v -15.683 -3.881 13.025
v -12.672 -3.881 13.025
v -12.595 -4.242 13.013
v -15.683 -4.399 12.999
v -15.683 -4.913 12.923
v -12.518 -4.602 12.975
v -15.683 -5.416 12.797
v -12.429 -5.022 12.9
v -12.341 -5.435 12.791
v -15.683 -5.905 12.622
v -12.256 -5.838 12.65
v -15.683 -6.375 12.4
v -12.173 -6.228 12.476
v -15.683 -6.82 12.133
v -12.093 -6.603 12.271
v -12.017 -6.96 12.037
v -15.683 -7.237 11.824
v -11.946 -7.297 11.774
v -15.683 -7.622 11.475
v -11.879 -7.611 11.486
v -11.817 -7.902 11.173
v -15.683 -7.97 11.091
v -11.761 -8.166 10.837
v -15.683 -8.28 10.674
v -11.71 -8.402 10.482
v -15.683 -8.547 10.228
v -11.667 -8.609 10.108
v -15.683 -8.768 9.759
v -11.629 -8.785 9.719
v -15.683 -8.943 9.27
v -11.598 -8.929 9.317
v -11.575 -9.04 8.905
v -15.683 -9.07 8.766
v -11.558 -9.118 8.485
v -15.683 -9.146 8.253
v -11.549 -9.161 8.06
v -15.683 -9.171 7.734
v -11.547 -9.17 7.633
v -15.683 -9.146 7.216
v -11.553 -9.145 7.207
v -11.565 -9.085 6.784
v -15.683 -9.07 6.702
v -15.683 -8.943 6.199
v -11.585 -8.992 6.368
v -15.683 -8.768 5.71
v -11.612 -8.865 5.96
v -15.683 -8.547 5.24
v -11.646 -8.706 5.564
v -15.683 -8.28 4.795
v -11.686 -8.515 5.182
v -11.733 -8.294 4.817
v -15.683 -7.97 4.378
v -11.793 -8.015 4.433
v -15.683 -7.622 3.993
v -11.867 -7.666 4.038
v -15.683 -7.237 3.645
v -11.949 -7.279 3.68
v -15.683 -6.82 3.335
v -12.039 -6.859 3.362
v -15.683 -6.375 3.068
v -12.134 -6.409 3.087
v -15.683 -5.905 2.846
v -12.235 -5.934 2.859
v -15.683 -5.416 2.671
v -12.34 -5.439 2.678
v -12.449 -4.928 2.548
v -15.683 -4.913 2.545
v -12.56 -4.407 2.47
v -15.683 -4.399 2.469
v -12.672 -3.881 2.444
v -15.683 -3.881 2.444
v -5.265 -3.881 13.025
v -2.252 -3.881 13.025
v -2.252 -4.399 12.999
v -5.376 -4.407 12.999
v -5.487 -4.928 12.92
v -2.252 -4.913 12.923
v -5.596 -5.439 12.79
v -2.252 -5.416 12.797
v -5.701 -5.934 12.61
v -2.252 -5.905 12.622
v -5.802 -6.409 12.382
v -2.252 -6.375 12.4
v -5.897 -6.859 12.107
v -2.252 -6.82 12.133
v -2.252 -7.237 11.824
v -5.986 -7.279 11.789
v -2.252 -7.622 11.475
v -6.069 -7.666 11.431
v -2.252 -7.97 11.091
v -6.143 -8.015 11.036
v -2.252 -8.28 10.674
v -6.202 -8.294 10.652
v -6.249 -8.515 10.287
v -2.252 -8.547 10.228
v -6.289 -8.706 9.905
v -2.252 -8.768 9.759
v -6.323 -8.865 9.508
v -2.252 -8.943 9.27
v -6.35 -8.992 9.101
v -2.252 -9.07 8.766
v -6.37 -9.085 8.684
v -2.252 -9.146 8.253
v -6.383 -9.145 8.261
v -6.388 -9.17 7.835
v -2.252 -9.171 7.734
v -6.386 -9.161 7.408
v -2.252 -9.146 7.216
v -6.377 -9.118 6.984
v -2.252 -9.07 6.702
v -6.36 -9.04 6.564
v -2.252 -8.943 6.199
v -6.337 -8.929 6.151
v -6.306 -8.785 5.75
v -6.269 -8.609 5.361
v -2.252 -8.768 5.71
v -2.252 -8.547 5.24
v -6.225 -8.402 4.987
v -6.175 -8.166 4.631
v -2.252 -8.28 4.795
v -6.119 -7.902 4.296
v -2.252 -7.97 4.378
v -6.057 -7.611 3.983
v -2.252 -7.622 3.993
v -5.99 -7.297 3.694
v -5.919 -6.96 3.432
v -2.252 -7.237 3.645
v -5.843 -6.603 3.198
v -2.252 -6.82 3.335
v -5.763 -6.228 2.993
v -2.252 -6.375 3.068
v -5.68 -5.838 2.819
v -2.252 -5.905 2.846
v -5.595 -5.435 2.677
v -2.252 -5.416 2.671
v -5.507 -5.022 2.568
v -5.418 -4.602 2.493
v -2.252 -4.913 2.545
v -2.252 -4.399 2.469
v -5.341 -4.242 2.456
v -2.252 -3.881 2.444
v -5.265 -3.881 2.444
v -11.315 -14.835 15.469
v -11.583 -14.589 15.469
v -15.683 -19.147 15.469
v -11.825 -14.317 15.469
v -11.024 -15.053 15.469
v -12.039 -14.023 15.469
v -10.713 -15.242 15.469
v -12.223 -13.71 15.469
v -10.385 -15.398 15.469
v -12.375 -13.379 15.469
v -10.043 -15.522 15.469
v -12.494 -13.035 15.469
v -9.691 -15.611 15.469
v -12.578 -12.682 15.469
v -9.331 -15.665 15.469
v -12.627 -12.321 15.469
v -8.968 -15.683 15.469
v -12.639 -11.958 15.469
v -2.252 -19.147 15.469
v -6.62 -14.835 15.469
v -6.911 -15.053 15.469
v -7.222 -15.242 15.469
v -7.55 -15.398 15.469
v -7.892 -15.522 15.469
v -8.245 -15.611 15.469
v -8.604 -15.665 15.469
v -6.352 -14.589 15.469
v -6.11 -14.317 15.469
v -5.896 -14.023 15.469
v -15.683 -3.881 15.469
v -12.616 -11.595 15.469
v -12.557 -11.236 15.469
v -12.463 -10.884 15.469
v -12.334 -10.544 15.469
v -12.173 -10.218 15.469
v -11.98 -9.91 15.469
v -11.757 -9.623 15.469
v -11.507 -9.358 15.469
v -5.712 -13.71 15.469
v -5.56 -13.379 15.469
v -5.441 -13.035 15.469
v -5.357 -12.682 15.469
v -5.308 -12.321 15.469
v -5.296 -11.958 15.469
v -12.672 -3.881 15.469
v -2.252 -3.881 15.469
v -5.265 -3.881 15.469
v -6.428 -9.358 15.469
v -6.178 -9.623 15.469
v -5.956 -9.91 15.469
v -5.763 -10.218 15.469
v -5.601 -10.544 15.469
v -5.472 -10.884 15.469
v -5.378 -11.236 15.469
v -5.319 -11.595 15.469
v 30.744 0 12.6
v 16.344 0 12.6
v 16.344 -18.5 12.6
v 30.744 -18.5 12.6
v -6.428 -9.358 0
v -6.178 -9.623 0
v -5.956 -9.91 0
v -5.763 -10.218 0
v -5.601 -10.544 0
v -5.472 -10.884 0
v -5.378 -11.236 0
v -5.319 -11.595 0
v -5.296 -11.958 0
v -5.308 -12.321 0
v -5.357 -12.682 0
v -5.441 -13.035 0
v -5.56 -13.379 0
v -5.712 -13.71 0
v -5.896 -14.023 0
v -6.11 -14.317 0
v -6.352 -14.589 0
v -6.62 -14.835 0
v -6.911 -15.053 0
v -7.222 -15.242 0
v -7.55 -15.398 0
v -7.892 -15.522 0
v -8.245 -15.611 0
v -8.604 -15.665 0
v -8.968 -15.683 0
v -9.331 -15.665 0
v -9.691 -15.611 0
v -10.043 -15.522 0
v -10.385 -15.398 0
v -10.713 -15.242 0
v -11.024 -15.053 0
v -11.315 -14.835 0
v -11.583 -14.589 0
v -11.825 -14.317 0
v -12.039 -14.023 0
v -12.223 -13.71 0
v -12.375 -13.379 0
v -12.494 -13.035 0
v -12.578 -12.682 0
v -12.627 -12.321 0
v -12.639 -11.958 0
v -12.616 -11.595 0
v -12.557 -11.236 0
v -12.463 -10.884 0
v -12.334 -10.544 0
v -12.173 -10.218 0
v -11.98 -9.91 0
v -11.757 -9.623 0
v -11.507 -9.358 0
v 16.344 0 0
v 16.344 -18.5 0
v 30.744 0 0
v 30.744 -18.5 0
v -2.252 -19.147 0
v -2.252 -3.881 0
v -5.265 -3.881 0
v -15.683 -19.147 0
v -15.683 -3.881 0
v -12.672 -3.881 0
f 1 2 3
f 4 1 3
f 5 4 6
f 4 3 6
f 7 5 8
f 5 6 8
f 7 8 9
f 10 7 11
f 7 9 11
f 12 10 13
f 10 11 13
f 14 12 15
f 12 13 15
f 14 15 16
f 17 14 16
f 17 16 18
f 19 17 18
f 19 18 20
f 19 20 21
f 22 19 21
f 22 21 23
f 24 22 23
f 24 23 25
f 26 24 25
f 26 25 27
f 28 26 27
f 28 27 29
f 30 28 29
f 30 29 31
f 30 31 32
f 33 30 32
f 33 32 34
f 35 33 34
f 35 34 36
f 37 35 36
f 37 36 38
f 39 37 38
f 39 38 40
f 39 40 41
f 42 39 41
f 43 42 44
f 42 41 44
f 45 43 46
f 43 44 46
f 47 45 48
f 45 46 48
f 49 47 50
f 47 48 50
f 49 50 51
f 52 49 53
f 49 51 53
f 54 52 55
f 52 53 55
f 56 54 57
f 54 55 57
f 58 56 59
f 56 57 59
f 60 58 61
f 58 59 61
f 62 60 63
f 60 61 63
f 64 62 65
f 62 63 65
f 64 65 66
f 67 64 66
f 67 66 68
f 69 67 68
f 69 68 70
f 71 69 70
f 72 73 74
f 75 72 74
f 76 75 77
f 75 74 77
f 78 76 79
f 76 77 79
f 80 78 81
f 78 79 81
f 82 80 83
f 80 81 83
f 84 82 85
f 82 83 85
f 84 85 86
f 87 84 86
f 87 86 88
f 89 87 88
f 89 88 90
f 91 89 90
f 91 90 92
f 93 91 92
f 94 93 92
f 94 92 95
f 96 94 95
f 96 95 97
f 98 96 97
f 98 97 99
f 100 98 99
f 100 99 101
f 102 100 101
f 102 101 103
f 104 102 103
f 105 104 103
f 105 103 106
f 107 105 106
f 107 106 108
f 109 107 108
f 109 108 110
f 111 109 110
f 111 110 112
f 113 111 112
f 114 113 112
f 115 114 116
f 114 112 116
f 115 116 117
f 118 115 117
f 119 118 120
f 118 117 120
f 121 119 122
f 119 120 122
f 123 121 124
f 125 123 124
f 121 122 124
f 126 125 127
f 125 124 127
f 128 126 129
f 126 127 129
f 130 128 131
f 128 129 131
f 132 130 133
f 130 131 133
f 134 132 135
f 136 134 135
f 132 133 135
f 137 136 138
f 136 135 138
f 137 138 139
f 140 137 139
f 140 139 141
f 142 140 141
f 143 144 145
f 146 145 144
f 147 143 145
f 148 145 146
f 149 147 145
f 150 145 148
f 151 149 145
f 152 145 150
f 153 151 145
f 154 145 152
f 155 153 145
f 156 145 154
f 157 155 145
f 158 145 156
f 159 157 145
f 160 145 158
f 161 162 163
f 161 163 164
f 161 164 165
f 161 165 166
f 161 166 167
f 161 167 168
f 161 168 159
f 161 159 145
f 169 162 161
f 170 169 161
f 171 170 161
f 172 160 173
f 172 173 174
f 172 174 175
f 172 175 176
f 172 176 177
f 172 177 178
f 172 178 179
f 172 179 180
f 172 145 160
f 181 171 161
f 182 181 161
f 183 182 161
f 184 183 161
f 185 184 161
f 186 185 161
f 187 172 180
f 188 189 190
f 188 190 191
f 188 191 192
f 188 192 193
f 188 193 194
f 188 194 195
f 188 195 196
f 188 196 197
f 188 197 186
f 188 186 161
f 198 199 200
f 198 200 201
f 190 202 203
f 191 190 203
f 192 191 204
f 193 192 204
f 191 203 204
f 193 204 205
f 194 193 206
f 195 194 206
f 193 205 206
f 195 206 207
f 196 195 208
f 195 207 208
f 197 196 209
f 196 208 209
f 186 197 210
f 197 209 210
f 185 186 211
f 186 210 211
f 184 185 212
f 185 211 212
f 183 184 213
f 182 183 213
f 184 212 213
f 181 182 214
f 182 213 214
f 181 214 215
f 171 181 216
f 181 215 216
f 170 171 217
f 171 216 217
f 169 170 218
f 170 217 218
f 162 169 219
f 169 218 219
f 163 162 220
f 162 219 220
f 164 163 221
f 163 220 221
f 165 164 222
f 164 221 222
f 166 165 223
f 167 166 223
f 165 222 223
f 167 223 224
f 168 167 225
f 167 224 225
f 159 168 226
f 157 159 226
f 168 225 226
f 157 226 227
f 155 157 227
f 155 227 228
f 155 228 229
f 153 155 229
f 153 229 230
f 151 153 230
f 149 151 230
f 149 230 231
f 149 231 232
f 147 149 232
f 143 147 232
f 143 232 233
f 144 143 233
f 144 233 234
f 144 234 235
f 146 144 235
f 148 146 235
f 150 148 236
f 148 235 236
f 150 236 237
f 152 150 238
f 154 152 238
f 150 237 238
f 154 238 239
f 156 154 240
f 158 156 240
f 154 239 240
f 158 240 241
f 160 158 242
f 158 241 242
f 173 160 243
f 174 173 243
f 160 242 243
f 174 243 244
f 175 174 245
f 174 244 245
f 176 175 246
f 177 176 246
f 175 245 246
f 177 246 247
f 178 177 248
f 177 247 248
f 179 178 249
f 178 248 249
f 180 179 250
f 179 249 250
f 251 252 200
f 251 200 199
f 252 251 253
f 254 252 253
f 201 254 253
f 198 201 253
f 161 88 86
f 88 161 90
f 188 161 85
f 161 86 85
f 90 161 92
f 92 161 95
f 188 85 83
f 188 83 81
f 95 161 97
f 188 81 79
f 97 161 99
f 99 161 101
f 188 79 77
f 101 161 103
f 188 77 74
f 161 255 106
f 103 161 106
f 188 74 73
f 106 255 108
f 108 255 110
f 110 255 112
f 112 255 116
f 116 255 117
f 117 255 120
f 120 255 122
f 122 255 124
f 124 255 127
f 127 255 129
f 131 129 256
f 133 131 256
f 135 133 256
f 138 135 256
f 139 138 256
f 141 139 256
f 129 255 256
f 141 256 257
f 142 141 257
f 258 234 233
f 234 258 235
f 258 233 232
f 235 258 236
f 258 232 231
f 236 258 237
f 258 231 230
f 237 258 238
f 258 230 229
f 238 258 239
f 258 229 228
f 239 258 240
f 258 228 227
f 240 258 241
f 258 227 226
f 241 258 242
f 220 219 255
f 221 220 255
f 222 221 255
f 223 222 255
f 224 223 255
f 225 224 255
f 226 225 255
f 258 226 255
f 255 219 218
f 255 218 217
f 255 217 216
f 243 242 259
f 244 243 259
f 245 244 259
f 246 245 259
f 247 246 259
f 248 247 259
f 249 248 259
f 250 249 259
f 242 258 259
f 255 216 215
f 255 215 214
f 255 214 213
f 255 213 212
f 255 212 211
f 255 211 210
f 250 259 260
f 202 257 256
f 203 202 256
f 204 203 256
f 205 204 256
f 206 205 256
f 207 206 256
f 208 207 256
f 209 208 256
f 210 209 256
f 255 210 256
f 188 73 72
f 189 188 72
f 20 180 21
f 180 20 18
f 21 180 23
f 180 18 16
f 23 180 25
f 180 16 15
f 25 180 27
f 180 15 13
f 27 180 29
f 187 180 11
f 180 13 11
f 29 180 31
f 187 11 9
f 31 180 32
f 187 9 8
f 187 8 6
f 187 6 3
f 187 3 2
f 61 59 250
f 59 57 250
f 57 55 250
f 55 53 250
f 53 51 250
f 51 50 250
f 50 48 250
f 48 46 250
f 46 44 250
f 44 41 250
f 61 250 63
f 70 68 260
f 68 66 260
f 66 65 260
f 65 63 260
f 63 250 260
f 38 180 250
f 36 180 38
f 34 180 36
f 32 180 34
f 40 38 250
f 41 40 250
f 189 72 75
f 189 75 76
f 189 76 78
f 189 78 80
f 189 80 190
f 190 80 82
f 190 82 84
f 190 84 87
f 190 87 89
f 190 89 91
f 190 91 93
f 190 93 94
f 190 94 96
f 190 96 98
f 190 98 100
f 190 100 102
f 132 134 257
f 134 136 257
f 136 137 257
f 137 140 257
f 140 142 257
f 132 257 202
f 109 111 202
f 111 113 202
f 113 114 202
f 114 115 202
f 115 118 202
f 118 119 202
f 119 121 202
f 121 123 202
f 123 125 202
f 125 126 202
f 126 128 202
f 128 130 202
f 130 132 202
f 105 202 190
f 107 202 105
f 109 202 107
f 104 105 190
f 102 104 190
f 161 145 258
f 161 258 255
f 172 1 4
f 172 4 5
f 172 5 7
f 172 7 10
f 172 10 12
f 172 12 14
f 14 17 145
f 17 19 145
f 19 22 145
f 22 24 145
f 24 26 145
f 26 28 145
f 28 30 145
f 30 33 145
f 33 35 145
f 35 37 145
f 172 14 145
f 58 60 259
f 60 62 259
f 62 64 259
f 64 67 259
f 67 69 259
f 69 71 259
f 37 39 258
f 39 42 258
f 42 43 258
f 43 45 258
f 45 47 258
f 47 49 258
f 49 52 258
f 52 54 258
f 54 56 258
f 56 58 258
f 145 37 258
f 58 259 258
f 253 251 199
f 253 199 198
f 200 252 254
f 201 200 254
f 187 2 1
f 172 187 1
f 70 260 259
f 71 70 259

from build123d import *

# Parameters (mm, degrees)
F1_DEPTH = 15.4686
F3_DEPTH = 25.4
F4_W     = 14.4
F4_H     = 18.5
F5_DEPTH = 12.6


with BuildPart() as f1:
    # F0 (on Top) → F1 (new body)
    with BuildSketch(Plane.XY):
        with BuildLine():
            Line((-12.6717286184, -3.8805939257), (-15.6828127801, -3.8805939257))
            Line((-15.6828127801, -3.8805939257), (-15.6828127801, -19.1473122686))
            Line((-15.6828127801, -19.1473122686), (-2.2524250671, -19.1473122686))
            Line((-2.2524250671, -19.1473122686), (-2.2524250671, -3.8805939257))
            Line((-2.2524250671, -3.8805939257), (-5.2646137774, -3.8805939257))
            Line((-5.2646137774, -3.8805939257), (-6.4280647547, -9.3582948019))
            ThreePointArc((-6.4280647547, -9.3582948019), (-8.9676189236, -15.6831096095), (-11.5071730925, -9.3582948019))
            Line((-11.5071730925, -9.3582948019), (-12.6717286184, -3.8805939257))
        make_face()
    extrude(amount=F1_DEPTH)

    # F2 (on face) → F3 (cut)
    with BuildSketch(Plane.YZ.offset(-2.2524250671)):
        with BuildLine():
            Line((-3.8805939257, 7.7343), (-3.8805939257, 13.0249166941))
            ThreePointArc((-3.8805939257, 13.0249166941), (-9.1712106198, 7.7343), (-3.8805939257, 2.4436833059))
            Line((-3.8805939257, 2.4436833059), (-3.8805939257, 2.4579335004))
            Line((-3.8805939257, 2.4579335004), (-3.8805939257, 7.7343))
        make_face()
    extrude(amount=-F3_DEPTH, mode=Mode.SUBTRACT)


with BuildPart() as f5:
    # F4 (on Top) → F5 (new body)
    with BuildSketch(Plane.XY):
        with Locations((23.5437798619, -9.25)):
            Rectangle(F4_W, F4_H)
    extrude(amount=F5_DEPTH)


solid = Compound([f1.part, f5.part])
